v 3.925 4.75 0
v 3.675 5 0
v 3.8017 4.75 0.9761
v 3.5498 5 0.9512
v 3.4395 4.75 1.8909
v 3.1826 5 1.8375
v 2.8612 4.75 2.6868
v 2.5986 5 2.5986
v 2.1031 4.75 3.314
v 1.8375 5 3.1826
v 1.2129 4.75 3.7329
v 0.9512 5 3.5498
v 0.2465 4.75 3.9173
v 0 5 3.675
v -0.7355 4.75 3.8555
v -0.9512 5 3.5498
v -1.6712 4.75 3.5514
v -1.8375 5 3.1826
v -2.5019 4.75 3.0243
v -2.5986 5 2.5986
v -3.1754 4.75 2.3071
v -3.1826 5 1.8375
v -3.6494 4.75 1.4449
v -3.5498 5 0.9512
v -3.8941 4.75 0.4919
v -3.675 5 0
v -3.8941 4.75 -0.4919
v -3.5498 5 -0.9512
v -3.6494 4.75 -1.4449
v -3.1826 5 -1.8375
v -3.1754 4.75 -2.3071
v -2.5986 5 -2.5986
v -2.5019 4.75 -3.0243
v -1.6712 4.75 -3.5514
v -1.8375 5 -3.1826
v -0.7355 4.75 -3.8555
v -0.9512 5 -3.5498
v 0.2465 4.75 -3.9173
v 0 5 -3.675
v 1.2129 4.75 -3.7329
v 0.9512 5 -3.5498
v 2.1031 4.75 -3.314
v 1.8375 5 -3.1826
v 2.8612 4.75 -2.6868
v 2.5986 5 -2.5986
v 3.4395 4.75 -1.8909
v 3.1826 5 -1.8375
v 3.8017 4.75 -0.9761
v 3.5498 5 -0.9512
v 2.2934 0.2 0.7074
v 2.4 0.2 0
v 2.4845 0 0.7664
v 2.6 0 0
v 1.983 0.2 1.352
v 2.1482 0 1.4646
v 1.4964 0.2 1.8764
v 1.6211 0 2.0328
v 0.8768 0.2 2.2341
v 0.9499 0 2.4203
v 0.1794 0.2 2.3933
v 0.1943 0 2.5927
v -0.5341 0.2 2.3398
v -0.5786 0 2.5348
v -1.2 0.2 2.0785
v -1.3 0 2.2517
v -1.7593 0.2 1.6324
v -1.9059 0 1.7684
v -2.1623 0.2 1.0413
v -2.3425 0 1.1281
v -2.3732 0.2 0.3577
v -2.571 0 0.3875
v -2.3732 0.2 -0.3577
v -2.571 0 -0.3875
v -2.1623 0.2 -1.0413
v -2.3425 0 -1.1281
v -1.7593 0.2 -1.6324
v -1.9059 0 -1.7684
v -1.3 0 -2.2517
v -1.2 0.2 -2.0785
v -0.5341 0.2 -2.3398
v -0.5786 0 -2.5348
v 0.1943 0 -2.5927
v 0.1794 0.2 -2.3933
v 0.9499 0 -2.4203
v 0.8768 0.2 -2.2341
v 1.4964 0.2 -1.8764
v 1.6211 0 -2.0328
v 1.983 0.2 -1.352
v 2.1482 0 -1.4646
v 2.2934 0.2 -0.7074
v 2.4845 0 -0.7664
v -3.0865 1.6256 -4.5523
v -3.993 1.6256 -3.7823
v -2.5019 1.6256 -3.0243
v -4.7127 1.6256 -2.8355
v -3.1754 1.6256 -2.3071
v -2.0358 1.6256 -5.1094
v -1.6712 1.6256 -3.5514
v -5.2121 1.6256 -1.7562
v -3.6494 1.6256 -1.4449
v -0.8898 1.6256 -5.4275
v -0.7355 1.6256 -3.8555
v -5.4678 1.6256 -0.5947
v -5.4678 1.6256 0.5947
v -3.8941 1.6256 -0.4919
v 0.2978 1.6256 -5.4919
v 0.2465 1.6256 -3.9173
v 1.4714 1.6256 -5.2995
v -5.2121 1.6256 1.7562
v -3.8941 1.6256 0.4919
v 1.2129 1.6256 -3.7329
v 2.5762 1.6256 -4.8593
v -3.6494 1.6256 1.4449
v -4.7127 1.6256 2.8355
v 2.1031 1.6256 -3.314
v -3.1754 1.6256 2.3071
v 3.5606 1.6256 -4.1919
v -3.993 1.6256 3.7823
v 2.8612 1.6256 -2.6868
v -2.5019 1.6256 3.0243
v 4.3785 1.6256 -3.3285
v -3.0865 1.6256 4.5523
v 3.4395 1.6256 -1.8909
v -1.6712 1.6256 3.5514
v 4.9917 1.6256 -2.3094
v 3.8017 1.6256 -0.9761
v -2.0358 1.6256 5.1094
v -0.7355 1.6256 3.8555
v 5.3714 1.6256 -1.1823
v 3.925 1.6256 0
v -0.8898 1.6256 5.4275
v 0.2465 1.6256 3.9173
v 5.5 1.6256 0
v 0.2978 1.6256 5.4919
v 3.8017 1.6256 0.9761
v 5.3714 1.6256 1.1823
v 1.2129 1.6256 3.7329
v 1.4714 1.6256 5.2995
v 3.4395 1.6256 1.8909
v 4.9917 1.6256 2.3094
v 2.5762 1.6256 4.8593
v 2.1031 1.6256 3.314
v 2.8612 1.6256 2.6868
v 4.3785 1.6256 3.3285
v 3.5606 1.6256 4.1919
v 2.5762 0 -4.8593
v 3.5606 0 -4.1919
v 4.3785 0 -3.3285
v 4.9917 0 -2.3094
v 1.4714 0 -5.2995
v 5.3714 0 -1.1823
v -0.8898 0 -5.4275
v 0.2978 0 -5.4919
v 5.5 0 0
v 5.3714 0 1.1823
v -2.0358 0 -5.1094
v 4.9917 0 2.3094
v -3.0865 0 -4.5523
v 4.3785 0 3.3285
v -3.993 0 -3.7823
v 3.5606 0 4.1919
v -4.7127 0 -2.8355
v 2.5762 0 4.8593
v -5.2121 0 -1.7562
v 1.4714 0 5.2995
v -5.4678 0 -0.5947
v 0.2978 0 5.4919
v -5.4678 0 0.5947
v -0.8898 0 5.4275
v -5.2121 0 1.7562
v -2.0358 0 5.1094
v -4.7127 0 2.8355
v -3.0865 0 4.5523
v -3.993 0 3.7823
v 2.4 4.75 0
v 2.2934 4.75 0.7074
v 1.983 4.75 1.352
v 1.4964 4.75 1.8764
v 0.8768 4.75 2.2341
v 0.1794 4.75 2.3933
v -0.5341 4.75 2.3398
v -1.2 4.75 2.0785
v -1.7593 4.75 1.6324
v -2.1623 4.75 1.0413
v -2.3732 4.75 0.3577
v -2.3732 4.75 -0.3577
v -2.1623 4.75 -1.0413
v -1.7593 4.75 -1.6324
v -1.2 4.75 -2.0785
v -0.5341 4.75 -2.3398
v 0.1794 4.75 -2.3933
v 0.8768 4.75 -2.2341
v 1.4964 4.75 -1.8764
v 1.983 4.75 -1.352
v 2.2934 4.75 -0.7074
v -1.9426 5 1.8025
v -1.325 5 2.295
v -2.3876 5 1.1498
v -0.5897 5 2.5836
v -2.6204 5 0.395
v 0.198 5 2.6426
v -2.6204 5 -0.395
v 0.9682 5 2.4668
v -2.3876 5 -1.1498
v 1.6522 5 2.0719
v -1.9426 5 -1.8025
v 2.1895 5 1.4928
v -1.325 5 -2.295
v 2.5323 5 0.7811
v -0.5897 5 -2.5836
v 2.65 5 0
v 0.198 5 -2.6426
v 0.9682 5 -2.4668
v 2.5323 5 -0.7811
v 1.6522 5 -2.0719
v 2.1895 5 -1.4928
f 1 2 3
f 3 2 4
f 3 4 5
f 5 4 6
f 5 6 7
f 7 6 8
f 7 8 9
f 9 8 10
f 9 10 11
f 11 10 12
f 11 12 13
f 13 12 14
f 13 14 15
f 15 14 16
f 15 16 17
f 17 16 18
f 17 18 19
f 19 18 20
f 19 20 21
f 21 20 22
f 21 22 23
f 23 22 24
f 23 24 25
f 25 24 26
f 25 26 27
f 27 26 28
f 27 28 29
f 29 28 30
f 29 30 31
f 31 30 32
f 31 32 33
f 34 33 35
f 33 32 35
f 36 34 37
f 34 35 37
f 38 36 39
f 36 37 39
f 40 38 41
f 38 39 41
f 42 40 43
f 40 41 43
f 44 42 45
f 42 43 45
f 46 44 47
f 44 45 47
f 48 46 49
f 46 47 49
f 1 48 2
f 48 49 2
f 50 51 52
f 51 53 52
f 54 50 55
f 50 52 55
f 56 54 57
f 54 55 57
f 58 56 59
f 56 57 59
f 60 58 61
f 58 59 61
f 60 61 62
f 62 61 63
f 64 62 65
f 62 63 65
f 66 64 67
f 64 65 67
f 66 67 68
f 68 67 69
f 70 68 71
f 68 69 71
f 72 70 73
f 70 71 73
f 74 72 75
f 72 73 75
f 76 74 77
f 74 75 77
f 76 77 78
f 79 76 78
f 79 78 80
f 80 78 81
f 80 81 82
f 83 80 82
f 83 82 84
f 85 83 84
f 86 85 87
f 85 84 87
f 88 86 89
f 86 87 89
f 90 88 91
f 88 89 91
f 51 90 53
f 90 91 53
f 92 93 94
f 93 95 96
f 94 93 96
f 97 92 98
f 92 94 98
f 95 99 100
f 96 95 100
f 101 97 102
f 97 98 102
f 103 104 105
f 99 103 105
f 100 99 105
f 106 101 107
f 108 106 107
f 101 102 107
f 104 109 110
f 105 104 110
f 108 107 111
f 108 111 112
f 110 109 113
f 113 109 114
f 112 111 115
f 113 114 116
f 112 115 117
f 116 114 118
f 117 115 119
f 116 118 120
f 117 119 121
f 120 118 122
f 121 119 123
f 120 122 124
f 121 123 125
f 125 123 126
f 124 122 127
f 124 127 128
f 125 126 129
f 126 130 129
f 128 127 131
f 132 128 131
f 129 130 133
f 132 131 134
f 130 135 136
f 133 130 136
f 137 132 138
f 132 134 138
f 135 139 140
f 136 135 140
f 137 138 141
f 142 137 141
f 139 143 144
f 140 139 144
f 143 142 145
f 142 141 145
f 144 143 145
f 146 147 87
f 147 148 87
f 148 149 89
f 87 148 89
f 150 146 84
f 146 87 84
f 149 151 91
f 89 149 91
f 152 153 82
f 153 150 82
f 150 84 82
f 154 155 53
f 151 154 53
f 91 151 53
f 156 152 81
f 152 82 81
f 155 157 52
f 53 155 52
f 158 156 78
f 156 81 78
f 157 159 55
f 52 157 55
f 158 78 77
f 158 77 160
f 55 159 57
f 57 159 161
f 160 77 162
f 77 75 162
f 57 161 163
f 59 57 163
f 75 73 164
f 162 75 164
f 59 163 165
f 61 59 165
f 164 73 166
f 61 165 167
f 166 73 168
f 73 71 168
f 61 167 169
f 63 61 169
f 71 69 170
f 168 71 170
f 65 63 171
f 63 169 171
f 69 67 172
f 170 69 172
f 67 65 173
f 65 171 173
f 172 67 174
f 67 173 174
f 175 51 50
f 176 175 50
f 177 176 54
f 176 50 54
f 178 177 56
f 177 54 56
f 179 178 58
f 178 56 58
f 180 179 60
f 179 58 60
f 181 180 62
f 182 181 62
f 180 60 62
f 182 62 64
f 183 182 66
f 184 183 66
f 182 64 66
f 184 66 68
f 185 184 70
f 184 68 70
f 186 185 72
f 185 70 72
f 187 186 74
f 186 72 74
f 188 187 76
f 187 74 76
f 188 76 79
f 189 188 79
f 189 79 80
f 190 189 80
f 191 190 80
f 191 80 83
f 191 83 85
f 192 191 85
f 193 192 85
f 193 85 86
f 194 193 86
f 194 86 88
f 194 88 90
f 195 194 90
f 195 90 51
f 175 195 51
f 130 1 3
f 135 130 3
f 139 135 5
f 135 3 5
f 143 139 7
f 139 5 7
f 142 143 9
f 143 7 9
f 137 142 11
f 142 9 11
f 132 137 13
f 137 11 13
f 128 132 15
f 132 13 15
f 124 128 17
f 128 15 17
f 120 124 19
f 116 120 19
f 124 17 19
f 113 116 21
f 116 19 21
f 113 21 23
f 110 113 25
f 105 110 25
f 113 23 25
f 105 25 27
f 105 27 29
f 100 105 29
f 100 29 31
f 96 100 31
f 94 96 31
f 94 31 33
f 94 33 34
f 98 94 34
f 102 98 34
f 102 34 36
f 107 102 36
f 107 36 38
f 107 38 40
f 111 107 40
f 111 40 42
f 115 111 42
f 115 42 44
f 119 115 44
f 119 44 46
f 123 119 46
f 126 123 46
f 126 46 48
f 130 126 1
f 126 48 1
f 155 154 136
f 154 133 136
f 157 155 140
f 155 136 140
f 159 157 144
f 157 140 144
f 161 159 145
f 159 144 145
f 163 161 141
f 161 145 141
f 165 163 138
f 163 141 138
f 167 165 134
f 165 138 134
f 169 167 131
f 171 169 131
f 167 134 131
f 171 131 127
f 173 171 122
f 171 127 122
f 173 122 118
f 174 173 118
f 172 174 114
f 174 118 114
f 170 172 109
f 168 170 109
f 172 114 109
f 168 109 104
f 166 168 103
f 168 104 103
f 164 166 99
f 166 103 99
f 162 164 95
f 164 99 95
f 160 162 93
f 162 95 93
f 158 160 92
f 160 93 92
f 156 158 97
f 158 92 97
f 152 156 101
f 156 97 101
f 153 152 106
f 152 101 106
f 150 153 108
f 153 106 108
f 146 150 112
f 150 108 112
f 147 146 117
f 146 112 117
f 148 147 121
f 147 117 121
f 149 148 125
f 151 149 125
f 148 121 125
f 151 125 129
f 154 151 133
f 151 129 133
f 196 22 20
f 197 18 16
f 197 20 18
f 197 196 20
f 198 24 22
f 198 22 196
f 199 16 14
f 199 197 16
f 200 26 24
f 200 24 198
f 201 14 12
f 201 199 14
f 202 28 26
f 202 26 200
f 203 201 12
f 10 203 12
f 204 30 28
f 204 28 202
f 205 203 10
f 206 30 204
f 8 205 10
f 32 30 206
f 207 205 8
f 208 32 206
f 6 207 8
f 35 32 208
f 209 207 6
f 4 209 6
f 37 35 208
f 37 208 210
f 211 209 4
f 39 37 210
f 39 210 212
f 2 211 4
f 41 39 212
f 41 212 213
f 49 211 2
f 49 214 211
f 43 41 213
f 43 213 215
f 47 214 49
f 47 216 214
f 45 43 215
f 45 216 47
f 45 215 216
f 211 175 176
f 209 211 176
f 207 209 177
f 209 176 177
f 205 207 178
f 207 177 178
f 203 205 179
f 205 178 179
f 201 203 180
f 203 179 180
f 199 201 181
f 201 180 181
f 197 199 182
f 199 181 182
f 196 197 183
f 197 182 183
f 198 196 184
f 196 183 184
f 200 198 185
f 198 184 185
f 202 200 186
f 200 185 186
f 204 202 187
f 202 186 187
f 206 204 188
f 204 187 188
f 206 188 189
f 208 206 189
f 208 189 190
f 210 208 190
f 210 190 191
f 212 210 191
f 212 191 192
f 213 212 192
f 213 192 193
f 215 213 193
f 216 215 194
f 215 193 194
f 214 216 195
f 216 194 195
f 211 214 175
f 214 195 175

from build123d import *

# Parameters (mm, degrees)
SKETCH2_W               = 14
SKETCH2_H               = 8
CUT_EXTRUDE1_DEPTH      = 6.5
CUT_EXTRUDE1_DEPTH_BACK = 6.5
CHAMFER1_SIZE           = 0.25


with BuildPart() as part:
    # Sketch1 → Revolve1 (revolve)
    with BuildSketch(Plane.XY):
        Polygon((3.925, 1.6256), (3.925, 12.4), (2.4, 12.4), (2.4, 0.2), (2.6, 0), (5.5, 0), (5.5, 1.6256), align=None)
    revolve(axis=Axis((0, 0, 0), (0, -1, 0)))

    # Sketch2 → Cut-Extrude1 (cut, two sides)
    with BuildSketch(Plane.XY) as cut_extrude1_sk:
        with Locations((0, 9)):
            Rectangle(SKETCH2_W, SKETCH2_H)
    extrude(amount=CUT_EXTRUDE1_DEPTH, mode=Mode.SUBTRACT)
    extrude(cut_extrude1_sk.sketch, amount=-CUT_EXTRUDE1_DEPTH_BACK, mode=Mode.SUBTRACT)

    # Chamfer1
    chamfer1_edges = [part.edges().sort_by_distance(p)[0] for p in [
        (-3.925, 5, 0),
        (-2.4, 5, 0),
    ]]
    chamfer(chamfer1_edges, length=CHAMFER1_SIZE)


solid = part.part
